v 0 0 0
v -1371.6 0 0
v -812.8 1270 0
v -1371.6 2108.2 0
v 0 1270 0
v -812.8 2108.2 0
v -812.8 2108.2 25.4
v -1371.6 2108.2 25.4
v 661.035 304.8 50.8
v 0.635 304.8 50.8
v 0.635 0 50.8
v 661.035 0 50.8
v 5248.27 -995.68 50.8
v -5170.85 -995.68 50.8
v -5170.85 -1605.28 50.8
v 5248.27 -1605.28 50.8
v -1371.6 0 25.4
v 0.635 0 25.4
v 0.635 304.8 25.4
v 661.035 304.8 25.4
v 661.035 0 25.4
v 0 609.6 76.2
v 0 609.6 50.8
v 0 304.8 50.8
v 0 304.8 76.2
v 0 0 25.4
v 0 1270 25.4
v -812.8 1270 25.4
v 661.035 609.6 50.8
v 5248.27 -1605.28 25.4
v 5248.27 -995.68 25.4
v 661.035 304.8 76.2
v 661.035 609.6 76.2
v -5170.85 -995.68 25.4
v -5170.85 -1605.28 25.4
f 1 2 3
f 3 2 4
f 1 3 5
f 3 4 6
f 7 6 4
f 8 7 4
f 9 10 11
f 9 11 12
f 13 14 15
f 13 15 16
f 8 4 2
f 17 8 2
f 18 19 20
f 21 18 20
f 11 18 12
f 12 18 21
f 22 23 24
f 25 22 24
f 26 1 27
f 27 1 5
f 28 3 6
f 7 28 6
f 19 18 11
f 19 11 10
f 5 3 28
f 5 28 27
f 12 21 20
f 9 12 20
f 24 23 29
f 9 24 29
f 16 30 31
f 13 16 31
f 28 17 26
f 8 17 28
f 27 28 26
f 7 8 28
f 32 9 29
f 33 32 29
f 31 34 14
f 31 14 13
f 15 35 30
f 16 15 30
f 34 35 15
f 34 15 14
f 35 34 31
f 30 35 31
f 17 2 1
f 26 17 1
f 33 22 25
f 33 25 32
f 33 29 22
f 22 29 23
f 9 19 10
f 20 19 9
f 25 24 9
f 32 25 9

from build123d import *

# Parameters (mm, degrees)
F0_W     = 812.8
F0_H     = 1270
F1_DEPTH = 25.4
F2_W     = 660.4
F2_H     = 304.8
F3_DEPTH = 25.4
F4_W     = 10419.1197770573
F4_H     = 609.6
F5_DEPTH = 25.4
F7_DEPTH = 25.4


# Not quite as in the source:
# - a feature names something its author has since deleted; it is built from what else it names


with BuildPart() as f1:
    # F0 (on Top) → F1 (new body)
    with BuildSketch(Plane.XY):
        Polygon((-1371.6, 0), (-812.8, 0), (-812.8, 1270), (-812.8, 2108.2), (-1371.6, 2108.2), align=None)
        with Locations((-406.4, 635)):
            Rectangle(F0_W, F0_H)
    extrude(amount=F1_DEPTH)


with BuildPart() as f3:
    # F2 (on face) → F3 (new body)
    with BuildSketch(Plane.XY.offset(25.4)):
        with Locations((330.835, 152.4)):
            Rectangle(F2_W, F2_H)
    extrude(amount=F3_DEPTH)


with BuildPart() as f5:
    # F4 (on face) → F5 (new body)
    with BuildSketch(Plane.XY.offset(25.4)):
        with Locations((38.7099906802, -1300.48)):
            Rectangle(F4_W, F4_H)
    extrude(amount=F5_DEPTH)


with BuildPart() as f7:
    # F6 (on face) → F7 (new body)
    with BuildSketch(Plane.XY.offset(50.8)):
        Polygon((0.635, 304.8), (661.035, 304.8), (661.035, 609.6), (0, 609.6), (0, 304.8), align=None)
    extrude(amount=F7_DEPTH)


solid = Compound([f1.part, f3.part, f5.part, f7.part])
